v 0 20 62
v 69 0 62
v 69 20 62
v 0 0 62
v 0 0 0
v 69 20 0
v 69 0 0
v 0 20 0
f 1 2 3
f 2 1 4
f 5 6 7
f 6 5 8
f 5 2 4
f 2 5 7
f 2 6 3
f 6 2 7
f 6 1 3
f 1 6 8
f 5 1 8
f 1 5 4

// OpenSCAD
//Leiterspitzen

//Höhe
h=62;
//Tiefe
d=20;
//Breite
b=69;

cube([b, d, h]);
